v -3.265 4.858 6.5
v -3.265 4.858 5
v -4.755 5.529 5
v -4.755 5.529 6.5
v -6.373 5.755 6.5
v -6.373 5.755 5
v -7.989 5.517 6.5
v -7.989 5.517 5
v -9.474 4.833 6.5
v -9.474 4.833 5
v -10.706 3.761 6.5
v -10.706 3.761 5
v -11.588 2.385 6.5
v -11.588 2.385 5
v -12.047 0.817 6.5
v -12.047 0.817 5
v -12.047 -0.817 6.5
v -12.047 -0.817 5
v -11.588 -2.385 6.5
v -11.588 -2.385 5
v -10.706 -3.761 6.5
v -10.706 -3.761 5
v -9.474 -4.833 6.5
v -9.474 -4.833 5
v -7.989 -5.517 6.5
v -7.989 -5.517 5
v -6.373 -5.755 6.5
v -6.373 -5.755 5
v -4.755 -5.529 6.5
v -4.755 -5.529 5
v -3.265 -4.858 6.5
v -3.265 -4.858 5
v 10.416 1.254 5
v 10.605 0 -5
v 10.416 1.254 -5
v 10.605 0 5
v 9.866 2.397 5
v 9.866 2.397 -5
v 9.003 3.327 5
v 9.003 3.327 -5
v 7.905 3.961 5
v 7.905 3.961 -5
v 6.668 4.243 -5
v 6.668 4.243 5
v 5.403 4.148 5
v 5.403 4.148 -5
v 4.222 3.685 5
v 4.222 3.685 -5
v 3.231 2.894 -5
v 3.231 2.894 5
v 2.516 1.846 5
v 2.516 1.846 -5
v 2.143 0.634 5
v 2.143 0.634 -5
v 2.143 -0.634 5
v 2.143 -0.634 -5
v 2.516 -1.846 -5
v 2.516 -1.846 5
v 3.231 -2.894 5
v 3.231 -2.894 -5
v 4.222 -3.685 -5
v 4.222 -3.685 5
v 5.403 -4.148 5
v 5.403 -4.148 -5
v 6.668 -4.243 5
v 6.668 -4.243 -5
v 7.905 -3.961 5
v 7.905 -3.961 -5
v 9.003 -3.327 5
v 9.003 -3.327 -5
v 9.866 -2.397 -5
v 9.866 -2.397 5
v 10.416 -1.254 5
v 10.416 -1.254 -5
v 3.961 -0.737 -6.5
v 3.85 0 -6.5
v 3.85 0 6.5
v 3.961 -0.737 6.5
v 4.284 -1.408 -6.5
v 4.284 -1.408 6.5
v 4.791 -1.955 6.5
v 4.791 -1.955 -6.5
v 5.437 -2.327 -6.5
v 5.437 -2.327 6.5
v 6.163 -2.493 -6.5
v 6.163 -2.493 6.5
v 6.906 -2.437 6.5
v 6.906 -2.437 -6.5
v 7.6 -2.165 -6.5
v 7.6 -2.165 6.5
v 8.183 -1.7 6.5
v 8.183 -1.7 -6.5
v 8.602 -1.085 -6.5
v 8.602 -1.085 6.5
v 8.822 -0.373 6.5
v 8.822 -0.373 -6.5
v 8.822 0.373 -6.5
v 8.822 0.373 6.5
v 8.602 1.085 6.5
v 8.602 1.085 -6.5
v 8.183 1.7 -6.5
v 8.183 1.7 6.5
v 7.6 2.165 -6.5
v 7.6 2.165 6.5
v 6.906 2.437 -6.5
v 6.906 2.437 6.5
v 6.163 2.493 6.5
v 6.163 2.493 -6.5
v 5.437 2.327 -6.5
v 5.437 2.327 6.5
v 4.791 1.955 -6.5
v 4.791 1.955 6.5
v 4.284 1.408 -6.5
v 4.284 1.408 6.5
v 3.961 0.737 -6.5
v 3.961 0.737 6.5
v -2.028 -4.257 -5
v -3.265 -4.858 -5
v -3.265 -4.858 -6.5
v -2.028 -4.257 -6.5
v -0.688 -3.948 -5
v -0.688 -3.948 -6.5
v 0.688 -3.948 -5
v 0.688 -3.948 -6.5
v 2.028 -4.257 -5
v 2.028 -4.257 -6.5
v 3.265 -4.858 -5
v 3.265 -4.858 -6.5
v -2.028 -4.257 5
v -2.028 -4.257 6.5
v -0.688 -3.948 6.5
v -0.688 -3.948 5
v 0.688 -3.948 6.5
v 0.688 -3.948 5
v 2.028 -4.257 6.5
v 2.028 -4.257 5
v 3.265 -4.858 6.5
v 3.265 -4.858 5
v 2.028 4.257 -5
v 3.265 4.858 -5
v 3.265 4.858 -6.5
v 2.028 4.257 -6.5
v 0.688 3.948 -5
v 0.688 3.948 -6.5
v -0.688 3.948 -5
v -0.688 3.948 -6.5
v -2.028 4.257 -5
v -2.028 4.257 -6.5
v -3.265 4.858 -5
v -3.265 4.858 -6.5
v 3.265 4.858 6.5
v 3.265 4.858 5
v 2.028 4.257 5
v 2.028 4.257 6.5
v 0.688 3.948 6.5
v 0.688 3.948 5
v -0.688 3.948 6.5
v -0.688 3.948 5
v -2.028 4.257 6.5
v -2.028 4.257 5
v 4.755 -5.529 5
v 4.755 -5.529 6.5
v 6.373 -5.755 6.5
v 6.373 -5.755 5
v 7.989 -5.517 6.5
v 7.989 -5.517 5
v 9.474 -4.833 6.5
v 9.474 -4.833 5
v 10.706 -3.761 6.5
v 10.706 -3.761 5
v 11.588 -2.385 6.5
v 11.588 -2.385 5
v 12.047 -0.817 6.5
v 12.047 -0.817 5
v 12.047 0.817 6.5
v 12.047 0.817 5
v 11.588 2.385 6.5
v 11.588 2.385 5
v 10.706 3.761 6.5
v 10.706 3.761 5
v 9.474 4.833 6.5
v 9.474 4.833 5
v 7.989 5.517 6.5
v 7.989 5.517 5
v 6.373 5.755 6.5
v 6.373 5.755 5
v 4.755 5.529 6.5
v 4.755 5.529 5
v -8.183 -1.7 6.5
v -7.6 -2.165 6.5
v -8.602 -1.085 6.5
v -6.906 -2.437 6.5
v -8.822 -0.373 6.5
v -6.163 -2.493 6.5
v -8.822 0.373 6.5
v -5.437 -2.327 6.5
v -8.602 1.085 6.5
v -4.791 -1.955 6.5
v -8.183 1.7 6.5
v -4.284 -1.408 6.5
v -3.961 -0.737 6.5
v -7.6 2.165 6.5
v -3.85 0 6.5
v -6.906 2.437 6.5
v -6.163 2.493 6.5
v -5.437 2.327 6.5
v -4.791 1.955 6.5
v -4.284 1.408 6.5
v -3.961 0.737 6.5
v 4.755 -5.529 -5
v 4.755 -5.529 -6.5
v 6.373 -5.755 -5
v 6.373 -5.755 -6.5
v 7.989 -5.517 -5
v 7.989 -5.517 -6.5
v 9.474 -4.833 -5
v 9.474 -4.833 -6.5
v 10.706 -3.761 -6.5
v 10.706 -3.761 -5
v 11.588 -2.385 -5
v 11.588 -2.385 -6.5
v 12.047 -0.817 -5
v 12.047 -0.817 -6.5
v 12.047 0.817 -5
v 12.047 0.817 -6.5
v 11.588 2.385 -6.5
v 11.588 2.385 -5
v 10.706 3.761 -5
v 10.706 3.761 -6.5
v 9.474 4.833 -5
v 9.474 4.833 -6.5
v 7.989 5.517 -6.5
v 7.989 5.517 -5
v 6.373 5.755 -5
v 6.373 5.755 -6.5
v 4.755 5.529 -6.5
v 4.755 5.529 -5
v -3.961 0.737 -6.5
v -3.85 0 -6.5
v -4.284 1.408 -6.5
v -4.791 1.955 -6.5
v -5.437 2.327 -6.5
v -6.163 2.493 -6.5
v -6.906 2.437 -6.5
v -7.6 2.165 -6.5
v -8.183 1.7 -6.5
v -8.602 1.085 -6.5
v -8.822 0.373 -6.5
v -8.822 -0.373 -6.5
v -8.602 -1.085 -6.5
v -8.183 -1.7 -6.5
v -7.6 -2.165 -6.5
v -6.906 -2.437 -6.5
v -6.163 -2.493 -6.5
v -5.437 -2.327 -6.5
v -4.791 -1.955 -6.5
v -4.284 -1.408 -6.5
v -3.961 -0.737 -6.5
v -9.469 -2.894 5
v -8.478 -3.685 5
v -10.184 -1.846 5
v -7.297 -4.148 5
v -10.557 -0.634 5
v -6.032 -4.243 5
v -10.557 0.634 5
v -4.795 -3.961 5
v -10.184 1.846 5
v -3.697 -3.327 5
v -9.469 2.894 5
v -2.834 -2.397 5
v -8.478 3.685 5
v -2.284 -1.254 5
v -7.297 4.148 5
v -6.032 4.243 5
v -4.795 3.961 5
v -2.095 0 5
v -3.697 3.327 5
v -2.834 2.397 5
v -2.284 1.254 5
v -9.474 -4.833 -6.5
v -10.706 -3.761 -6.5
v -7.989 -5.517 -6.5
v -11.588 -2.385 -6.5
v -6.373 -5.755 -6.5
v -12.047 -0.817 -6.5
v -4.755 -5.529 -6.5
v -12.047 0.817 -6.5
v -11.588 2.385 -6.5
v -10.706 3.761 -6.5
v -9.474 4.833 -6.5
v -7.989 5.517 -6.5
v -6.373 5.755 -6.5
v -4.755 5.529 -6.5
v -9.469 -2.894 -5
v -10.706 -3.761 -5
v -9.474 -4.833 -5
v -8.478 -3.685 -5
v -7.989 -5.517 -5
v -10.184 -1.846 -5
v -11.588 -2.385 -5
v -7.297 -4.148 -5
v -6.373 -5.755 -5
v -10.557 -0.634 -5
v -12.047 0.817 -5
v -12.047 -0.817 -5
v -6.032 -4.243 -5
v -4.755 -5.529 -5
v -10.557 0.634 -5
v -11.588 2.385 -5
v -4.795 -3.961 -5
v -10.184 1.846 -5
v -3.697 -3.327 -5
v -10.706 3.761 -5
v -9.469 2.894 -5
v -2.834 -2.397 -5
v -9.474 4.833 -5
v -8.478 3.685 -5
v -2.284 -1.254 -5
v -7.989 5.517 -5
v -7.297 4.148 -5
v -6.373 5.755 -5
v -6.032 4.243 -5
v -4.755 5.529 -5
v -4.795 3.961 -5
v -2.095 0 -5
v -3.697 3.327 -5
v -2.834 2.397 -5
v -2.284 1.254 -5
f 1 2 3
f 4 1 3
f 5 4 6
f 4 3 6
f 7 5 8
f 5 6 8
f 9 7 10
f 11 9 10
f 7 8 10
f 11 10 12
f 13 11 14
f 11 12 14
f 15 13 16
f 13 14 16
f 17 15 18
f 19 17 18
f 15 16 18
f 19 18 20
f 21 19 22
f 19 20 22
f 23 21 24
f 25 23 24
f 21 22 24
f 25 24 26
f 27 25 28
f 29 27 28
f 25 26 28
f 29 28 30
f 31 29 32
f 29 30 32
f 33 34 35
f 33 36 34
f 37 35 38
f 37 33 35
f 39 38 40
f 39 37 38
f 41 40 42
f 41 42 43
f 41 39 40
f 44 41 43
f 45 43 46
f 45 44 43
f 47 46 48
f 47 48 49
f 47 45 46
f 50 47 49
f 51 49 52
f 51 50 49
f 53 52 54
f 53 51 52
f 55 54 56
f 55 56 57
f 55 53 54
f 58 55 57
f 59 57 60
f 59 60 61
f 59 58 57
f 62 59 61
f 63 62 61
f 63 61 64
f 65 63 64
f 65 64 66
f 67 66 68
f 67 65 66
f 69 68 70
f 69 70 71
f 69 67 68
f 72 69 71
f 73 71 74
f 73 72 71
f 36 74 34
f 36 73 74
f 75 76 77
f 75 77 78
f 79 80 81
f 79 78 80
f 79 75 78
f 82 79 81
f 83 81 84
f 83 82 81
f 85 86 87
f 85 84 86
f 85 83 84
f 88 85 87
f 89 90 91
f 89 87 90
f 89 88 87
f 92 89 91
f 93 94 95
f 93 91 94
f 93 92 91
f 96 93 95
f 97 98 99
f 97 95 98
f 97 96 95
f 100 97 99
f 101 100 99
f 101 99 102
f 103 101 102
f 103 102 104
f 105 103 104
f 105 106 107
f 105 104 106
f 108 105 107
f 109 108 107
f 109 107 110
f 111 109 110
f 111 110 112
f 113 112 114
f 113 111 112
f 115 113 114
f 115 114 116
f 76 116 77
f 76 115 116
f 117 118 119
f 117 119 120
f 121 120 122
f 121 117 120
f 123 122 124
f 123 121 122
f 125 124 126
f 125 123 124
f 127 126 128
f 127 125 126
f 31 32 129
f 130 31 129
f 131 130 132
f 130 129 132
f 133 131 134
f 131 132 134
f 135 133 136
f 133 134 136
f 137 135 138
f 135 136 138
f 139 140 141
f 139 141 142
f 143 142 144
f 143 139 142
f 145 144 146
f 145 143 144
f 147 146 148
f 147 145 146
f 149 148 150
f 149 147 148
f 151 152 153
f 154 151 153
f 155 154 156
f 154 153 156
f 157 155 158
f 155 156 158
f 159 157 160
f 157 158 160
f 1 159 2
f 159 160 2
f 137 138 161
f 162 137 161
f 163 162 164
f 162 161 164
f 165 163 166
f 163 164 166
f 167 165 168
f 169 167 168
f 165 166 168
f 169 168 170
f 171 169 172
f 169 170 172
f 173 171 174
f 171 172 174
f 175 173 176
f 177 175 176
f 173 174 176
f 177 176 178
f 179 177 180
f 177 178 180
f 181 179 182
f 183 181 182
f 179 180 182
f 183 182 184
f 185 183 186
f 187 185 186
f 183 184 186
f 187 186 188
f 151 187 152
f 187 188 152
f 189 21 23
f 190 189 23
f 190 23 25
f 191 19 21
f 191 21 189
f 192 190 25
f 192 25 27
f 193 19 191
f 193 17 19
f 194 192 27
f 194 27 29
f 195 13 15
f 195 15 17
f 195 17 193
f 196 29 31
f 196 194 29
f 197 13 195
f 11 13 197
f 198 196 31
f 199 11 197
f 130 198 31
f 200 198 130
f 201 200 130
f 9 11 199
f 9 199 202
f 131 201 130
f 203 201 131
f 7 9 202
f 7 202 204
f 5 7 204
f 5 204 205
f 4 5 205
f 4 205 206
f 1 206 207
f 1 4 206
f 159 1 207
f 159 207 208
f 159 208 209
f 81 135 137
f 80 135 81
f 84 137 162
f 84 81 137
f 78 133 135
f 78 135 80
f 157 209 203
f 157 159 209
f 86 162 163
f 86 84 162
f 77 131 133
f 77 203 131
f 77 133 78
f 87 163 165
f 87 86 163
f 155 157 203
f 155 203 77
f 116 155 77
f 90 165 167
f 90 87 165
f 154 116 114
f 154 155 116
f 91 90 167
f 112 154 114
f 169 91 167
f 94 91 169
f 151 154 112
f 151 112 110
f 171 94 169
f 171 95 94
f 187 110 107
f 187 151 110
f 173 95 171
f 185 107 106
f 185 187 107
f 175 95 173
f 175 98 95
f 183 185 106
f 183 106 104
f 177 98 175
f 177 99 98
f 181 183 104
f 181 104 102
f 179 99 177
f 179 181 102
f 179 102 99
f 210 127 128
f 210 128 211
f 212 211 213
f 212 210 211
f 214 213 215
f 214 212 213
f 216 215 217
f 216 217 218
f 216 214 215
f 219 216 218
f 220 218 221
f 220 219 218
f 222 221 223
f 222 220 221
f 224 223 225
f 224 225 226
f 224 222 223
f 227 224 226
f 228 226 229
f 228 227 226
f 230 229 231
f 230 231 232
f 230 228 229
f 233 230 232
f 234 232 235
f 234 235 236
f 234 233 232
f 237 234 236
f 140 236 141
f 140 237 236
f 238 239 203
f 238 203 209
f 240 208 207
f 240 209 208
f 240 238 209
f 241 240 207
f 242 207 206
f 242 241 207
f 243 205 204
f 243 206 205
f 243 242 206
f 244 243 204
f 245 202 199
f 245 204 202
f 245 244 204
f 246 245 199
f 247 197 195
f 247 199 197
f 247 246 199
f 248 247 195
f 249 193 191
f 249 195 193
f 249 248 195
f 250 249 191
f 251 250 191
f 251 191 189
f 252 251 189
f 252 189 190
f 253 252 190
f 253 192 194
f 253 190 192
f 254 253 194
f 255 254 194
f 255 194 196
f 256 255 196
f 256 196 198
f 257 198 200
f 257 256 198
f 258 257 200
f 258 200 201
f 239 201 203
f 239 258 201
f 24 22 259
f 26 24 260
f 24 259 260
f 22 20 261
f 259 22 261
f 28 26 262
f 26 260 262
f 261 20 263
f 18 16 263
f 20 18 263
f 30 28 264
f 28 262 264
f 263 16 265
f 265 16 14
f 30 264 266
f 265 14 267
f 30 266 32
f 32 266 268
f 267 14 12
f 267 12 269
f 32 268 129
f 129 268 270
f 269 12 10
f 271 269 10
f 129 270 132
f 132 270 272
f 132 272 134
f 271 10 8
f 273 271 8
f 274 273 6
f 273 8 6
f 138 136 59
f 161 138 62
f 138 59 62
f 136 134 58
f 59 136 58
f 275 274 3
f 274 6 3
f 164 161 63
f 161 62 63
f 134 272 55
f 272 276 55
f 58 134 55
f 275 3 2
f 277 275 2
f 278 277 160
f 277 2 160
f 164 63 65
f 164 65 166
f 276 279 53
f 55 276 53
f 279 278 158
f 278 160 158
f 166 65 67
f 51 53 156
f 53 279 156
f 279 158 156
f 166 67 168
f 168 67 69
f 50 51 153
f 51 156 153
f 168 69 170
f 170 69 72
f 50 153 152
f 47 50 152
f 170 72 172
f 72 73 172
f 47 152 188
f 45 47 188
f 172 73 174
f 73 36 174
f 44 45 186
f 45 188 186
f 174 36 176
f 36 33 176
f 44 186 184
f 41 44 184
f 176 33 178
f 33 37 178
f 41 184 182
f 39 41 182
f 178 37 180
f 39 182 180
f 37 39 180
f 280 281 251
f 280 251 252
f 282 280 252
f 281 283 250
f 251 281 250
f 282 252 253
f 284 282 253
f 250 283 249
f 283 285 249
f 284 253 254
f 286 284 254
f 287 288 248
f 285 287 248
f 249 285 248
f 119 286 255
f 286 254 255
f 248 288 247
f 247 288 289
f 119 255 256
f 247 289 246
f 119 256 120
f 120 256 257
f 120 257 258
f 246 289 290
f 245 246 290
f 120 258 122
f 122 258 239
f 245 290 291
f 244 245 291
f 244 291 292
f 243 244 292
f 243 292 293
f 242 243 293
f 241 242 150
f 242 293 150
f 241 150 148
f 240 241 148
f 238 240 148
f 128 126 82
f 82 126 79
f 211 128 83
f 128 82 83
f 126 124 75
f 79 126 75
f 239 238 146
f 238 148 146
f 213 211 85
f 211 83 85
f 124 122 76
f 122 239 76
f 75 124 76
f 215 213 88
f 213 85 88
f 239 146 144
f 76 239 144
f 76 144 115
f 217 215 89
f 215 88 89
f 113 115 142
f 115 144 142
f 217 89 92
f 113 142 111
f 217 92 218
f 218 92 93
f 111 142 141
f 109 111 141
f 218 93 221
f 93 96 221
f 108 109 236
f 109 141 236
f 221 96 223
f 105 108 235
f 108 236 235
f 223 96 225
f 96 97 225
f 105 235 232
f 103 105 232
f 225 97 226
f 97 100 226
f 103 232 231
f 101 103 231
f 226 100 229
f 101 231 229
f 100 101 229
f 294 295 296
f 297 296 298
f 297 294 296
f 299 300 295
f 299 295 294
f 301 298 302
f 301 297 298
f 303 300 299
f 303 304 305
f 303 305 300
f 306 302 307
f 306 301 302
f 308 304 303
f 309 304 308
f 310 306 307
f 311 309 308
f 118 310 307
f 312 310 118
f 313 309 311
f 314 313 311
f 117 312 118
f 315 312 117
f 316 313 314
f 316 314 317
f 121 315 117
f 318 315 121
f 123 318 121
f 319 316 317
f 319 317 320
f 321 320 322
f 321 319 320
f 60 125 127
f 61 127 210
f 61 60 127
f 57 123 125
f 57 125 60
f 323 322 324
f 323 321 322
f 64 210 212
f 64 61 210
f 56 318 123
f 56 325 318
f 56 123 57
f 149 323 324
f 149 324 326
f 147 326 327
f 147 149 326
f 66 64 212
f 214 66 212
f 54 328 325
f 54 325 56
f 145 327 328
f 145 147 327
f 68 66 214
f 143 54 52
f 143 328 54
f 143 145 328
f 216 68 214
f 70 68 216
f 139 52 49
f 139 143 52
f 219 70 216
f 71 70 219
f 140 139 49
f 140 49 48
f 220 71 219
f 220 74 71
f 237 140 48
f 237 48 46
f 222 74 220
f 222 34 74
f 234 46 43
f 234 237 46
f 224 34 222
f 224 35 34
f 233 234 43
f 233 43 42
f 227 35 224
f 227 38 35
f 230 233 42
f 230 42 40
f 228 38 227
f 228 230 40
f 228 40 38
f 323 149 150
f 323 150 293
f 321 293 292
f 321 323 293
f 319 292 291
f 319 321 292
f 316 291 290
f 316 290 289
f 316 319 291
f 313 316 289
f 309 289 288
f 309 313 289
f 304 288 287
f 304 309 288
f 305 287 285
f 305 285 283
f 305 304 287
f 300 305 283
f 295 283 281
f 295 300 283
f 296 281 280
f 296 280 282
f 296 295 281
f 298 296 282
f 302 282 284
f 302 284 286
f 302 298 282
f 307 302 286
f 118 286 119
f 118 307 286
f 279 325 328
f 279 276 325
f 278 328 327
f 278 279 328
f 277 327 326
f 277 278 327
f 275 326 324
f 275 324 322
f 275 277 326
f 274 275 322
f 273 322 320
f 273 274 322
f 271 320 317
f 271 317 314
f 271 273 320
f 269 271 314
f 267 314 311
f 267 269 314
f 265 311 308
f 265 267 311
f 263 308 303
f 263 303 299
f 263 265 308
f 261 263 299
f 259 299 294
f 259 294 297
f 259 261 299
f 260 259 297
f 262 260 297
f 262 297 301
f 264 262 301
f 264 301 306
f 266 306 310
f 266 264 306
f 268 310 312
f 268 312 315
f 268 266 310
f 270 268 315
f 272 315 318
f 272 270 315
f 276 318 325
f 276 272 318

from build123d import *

# Parameters (mm, degrees)
SKETCH1_R               = 4.255
BOSS_EXTRUDE3_DEPTH     = 5
BOSS_EXTRUDE3_2_DEPTH   = 5
BOSS_EXTRUDE7_START     = -5
BOSS_EXTRUDE7_DEPTH     = 1.5
CUT_EXTRUDE1_DEPTH      = 15.896343511
CUT_EXTRUDE1_DEPTH_BACK = 15.896343511
SKETCH2_R               = 2.5


with BuildPart() as part:
    # Sketch1 → Boss-Extrude3 (new, symmetric)
    with BuildSketch(Plane.XY):
        with Locations((-6.35, 0)):
            Circle(SKETCH1_R)
    extrude(amount=BOSS_EXTRUDE3_DEPTH, both=True)



with BuildPart() as body_2:
    # Sketch1 → Boss-Extrude3 2 (new, symmetric)
    with BuildSketch(Plane.XY):
        with Locations((6.35, 0)):
            Circle(SKETCH1_R)
    extrude(amount=BOSS_EXTRUDE3_2_DEPTH, both=True)


with BuildPart() as part_1:
    add(part.part)

    add(body_2.part)  # Boss-Extrude7 merges body 2
    # Sketch1<5> → Boss-Extrude7 (add)
    with BuildSketch(Plane.XY.offset(BOSS_EXTRUDE7_START)):
        with BuildLine():
            ThreePointArc((-3.26499838, 4.858270268), (-12.105, 0), (-3.26499838, -4.858270268))
            ThreePointArc((-3.26499838, -4.858270268), (0, -3.909220161), (3.26499838, -4.858270268))
            ThreePointArc((3.26499838, -4.858270268), (12.105, 0), (3.26499838, 4.858270268))
            ThreePointArc((3.26499838, 4.858270268), (0, 3.909220161), (-3.26499838, 4.858270268))
        make_face()
    boss_extrude7 = extrude(amount=-BOSS_EXTRUDE7_DEPTH)

    # Mirror1: Boss-Extrude7 across plane
    add(boss_extrude7.mirror(Plane.XY))

    # Sketch2 → Cut-Extrude1 (cut, two sides: drawn at the far end of the back side and taken through both)
    with BuildSketch(Plane.XY.offset(-CUT_EXTRUDE1_DEPTH_BACK)):
        with Locations((-6.35, 0)):
            Circle(SKETCH2_R)
        with Locations((6.35, 0)):
            Circle(SKETCH2_R)
    extrude(amount=CUT_EXTRUDE1_DEPTH + CUT_EXTRUDE1_DEPTH_BACK, mode=Mode.SUBTRACT)


solid = part_1.part
